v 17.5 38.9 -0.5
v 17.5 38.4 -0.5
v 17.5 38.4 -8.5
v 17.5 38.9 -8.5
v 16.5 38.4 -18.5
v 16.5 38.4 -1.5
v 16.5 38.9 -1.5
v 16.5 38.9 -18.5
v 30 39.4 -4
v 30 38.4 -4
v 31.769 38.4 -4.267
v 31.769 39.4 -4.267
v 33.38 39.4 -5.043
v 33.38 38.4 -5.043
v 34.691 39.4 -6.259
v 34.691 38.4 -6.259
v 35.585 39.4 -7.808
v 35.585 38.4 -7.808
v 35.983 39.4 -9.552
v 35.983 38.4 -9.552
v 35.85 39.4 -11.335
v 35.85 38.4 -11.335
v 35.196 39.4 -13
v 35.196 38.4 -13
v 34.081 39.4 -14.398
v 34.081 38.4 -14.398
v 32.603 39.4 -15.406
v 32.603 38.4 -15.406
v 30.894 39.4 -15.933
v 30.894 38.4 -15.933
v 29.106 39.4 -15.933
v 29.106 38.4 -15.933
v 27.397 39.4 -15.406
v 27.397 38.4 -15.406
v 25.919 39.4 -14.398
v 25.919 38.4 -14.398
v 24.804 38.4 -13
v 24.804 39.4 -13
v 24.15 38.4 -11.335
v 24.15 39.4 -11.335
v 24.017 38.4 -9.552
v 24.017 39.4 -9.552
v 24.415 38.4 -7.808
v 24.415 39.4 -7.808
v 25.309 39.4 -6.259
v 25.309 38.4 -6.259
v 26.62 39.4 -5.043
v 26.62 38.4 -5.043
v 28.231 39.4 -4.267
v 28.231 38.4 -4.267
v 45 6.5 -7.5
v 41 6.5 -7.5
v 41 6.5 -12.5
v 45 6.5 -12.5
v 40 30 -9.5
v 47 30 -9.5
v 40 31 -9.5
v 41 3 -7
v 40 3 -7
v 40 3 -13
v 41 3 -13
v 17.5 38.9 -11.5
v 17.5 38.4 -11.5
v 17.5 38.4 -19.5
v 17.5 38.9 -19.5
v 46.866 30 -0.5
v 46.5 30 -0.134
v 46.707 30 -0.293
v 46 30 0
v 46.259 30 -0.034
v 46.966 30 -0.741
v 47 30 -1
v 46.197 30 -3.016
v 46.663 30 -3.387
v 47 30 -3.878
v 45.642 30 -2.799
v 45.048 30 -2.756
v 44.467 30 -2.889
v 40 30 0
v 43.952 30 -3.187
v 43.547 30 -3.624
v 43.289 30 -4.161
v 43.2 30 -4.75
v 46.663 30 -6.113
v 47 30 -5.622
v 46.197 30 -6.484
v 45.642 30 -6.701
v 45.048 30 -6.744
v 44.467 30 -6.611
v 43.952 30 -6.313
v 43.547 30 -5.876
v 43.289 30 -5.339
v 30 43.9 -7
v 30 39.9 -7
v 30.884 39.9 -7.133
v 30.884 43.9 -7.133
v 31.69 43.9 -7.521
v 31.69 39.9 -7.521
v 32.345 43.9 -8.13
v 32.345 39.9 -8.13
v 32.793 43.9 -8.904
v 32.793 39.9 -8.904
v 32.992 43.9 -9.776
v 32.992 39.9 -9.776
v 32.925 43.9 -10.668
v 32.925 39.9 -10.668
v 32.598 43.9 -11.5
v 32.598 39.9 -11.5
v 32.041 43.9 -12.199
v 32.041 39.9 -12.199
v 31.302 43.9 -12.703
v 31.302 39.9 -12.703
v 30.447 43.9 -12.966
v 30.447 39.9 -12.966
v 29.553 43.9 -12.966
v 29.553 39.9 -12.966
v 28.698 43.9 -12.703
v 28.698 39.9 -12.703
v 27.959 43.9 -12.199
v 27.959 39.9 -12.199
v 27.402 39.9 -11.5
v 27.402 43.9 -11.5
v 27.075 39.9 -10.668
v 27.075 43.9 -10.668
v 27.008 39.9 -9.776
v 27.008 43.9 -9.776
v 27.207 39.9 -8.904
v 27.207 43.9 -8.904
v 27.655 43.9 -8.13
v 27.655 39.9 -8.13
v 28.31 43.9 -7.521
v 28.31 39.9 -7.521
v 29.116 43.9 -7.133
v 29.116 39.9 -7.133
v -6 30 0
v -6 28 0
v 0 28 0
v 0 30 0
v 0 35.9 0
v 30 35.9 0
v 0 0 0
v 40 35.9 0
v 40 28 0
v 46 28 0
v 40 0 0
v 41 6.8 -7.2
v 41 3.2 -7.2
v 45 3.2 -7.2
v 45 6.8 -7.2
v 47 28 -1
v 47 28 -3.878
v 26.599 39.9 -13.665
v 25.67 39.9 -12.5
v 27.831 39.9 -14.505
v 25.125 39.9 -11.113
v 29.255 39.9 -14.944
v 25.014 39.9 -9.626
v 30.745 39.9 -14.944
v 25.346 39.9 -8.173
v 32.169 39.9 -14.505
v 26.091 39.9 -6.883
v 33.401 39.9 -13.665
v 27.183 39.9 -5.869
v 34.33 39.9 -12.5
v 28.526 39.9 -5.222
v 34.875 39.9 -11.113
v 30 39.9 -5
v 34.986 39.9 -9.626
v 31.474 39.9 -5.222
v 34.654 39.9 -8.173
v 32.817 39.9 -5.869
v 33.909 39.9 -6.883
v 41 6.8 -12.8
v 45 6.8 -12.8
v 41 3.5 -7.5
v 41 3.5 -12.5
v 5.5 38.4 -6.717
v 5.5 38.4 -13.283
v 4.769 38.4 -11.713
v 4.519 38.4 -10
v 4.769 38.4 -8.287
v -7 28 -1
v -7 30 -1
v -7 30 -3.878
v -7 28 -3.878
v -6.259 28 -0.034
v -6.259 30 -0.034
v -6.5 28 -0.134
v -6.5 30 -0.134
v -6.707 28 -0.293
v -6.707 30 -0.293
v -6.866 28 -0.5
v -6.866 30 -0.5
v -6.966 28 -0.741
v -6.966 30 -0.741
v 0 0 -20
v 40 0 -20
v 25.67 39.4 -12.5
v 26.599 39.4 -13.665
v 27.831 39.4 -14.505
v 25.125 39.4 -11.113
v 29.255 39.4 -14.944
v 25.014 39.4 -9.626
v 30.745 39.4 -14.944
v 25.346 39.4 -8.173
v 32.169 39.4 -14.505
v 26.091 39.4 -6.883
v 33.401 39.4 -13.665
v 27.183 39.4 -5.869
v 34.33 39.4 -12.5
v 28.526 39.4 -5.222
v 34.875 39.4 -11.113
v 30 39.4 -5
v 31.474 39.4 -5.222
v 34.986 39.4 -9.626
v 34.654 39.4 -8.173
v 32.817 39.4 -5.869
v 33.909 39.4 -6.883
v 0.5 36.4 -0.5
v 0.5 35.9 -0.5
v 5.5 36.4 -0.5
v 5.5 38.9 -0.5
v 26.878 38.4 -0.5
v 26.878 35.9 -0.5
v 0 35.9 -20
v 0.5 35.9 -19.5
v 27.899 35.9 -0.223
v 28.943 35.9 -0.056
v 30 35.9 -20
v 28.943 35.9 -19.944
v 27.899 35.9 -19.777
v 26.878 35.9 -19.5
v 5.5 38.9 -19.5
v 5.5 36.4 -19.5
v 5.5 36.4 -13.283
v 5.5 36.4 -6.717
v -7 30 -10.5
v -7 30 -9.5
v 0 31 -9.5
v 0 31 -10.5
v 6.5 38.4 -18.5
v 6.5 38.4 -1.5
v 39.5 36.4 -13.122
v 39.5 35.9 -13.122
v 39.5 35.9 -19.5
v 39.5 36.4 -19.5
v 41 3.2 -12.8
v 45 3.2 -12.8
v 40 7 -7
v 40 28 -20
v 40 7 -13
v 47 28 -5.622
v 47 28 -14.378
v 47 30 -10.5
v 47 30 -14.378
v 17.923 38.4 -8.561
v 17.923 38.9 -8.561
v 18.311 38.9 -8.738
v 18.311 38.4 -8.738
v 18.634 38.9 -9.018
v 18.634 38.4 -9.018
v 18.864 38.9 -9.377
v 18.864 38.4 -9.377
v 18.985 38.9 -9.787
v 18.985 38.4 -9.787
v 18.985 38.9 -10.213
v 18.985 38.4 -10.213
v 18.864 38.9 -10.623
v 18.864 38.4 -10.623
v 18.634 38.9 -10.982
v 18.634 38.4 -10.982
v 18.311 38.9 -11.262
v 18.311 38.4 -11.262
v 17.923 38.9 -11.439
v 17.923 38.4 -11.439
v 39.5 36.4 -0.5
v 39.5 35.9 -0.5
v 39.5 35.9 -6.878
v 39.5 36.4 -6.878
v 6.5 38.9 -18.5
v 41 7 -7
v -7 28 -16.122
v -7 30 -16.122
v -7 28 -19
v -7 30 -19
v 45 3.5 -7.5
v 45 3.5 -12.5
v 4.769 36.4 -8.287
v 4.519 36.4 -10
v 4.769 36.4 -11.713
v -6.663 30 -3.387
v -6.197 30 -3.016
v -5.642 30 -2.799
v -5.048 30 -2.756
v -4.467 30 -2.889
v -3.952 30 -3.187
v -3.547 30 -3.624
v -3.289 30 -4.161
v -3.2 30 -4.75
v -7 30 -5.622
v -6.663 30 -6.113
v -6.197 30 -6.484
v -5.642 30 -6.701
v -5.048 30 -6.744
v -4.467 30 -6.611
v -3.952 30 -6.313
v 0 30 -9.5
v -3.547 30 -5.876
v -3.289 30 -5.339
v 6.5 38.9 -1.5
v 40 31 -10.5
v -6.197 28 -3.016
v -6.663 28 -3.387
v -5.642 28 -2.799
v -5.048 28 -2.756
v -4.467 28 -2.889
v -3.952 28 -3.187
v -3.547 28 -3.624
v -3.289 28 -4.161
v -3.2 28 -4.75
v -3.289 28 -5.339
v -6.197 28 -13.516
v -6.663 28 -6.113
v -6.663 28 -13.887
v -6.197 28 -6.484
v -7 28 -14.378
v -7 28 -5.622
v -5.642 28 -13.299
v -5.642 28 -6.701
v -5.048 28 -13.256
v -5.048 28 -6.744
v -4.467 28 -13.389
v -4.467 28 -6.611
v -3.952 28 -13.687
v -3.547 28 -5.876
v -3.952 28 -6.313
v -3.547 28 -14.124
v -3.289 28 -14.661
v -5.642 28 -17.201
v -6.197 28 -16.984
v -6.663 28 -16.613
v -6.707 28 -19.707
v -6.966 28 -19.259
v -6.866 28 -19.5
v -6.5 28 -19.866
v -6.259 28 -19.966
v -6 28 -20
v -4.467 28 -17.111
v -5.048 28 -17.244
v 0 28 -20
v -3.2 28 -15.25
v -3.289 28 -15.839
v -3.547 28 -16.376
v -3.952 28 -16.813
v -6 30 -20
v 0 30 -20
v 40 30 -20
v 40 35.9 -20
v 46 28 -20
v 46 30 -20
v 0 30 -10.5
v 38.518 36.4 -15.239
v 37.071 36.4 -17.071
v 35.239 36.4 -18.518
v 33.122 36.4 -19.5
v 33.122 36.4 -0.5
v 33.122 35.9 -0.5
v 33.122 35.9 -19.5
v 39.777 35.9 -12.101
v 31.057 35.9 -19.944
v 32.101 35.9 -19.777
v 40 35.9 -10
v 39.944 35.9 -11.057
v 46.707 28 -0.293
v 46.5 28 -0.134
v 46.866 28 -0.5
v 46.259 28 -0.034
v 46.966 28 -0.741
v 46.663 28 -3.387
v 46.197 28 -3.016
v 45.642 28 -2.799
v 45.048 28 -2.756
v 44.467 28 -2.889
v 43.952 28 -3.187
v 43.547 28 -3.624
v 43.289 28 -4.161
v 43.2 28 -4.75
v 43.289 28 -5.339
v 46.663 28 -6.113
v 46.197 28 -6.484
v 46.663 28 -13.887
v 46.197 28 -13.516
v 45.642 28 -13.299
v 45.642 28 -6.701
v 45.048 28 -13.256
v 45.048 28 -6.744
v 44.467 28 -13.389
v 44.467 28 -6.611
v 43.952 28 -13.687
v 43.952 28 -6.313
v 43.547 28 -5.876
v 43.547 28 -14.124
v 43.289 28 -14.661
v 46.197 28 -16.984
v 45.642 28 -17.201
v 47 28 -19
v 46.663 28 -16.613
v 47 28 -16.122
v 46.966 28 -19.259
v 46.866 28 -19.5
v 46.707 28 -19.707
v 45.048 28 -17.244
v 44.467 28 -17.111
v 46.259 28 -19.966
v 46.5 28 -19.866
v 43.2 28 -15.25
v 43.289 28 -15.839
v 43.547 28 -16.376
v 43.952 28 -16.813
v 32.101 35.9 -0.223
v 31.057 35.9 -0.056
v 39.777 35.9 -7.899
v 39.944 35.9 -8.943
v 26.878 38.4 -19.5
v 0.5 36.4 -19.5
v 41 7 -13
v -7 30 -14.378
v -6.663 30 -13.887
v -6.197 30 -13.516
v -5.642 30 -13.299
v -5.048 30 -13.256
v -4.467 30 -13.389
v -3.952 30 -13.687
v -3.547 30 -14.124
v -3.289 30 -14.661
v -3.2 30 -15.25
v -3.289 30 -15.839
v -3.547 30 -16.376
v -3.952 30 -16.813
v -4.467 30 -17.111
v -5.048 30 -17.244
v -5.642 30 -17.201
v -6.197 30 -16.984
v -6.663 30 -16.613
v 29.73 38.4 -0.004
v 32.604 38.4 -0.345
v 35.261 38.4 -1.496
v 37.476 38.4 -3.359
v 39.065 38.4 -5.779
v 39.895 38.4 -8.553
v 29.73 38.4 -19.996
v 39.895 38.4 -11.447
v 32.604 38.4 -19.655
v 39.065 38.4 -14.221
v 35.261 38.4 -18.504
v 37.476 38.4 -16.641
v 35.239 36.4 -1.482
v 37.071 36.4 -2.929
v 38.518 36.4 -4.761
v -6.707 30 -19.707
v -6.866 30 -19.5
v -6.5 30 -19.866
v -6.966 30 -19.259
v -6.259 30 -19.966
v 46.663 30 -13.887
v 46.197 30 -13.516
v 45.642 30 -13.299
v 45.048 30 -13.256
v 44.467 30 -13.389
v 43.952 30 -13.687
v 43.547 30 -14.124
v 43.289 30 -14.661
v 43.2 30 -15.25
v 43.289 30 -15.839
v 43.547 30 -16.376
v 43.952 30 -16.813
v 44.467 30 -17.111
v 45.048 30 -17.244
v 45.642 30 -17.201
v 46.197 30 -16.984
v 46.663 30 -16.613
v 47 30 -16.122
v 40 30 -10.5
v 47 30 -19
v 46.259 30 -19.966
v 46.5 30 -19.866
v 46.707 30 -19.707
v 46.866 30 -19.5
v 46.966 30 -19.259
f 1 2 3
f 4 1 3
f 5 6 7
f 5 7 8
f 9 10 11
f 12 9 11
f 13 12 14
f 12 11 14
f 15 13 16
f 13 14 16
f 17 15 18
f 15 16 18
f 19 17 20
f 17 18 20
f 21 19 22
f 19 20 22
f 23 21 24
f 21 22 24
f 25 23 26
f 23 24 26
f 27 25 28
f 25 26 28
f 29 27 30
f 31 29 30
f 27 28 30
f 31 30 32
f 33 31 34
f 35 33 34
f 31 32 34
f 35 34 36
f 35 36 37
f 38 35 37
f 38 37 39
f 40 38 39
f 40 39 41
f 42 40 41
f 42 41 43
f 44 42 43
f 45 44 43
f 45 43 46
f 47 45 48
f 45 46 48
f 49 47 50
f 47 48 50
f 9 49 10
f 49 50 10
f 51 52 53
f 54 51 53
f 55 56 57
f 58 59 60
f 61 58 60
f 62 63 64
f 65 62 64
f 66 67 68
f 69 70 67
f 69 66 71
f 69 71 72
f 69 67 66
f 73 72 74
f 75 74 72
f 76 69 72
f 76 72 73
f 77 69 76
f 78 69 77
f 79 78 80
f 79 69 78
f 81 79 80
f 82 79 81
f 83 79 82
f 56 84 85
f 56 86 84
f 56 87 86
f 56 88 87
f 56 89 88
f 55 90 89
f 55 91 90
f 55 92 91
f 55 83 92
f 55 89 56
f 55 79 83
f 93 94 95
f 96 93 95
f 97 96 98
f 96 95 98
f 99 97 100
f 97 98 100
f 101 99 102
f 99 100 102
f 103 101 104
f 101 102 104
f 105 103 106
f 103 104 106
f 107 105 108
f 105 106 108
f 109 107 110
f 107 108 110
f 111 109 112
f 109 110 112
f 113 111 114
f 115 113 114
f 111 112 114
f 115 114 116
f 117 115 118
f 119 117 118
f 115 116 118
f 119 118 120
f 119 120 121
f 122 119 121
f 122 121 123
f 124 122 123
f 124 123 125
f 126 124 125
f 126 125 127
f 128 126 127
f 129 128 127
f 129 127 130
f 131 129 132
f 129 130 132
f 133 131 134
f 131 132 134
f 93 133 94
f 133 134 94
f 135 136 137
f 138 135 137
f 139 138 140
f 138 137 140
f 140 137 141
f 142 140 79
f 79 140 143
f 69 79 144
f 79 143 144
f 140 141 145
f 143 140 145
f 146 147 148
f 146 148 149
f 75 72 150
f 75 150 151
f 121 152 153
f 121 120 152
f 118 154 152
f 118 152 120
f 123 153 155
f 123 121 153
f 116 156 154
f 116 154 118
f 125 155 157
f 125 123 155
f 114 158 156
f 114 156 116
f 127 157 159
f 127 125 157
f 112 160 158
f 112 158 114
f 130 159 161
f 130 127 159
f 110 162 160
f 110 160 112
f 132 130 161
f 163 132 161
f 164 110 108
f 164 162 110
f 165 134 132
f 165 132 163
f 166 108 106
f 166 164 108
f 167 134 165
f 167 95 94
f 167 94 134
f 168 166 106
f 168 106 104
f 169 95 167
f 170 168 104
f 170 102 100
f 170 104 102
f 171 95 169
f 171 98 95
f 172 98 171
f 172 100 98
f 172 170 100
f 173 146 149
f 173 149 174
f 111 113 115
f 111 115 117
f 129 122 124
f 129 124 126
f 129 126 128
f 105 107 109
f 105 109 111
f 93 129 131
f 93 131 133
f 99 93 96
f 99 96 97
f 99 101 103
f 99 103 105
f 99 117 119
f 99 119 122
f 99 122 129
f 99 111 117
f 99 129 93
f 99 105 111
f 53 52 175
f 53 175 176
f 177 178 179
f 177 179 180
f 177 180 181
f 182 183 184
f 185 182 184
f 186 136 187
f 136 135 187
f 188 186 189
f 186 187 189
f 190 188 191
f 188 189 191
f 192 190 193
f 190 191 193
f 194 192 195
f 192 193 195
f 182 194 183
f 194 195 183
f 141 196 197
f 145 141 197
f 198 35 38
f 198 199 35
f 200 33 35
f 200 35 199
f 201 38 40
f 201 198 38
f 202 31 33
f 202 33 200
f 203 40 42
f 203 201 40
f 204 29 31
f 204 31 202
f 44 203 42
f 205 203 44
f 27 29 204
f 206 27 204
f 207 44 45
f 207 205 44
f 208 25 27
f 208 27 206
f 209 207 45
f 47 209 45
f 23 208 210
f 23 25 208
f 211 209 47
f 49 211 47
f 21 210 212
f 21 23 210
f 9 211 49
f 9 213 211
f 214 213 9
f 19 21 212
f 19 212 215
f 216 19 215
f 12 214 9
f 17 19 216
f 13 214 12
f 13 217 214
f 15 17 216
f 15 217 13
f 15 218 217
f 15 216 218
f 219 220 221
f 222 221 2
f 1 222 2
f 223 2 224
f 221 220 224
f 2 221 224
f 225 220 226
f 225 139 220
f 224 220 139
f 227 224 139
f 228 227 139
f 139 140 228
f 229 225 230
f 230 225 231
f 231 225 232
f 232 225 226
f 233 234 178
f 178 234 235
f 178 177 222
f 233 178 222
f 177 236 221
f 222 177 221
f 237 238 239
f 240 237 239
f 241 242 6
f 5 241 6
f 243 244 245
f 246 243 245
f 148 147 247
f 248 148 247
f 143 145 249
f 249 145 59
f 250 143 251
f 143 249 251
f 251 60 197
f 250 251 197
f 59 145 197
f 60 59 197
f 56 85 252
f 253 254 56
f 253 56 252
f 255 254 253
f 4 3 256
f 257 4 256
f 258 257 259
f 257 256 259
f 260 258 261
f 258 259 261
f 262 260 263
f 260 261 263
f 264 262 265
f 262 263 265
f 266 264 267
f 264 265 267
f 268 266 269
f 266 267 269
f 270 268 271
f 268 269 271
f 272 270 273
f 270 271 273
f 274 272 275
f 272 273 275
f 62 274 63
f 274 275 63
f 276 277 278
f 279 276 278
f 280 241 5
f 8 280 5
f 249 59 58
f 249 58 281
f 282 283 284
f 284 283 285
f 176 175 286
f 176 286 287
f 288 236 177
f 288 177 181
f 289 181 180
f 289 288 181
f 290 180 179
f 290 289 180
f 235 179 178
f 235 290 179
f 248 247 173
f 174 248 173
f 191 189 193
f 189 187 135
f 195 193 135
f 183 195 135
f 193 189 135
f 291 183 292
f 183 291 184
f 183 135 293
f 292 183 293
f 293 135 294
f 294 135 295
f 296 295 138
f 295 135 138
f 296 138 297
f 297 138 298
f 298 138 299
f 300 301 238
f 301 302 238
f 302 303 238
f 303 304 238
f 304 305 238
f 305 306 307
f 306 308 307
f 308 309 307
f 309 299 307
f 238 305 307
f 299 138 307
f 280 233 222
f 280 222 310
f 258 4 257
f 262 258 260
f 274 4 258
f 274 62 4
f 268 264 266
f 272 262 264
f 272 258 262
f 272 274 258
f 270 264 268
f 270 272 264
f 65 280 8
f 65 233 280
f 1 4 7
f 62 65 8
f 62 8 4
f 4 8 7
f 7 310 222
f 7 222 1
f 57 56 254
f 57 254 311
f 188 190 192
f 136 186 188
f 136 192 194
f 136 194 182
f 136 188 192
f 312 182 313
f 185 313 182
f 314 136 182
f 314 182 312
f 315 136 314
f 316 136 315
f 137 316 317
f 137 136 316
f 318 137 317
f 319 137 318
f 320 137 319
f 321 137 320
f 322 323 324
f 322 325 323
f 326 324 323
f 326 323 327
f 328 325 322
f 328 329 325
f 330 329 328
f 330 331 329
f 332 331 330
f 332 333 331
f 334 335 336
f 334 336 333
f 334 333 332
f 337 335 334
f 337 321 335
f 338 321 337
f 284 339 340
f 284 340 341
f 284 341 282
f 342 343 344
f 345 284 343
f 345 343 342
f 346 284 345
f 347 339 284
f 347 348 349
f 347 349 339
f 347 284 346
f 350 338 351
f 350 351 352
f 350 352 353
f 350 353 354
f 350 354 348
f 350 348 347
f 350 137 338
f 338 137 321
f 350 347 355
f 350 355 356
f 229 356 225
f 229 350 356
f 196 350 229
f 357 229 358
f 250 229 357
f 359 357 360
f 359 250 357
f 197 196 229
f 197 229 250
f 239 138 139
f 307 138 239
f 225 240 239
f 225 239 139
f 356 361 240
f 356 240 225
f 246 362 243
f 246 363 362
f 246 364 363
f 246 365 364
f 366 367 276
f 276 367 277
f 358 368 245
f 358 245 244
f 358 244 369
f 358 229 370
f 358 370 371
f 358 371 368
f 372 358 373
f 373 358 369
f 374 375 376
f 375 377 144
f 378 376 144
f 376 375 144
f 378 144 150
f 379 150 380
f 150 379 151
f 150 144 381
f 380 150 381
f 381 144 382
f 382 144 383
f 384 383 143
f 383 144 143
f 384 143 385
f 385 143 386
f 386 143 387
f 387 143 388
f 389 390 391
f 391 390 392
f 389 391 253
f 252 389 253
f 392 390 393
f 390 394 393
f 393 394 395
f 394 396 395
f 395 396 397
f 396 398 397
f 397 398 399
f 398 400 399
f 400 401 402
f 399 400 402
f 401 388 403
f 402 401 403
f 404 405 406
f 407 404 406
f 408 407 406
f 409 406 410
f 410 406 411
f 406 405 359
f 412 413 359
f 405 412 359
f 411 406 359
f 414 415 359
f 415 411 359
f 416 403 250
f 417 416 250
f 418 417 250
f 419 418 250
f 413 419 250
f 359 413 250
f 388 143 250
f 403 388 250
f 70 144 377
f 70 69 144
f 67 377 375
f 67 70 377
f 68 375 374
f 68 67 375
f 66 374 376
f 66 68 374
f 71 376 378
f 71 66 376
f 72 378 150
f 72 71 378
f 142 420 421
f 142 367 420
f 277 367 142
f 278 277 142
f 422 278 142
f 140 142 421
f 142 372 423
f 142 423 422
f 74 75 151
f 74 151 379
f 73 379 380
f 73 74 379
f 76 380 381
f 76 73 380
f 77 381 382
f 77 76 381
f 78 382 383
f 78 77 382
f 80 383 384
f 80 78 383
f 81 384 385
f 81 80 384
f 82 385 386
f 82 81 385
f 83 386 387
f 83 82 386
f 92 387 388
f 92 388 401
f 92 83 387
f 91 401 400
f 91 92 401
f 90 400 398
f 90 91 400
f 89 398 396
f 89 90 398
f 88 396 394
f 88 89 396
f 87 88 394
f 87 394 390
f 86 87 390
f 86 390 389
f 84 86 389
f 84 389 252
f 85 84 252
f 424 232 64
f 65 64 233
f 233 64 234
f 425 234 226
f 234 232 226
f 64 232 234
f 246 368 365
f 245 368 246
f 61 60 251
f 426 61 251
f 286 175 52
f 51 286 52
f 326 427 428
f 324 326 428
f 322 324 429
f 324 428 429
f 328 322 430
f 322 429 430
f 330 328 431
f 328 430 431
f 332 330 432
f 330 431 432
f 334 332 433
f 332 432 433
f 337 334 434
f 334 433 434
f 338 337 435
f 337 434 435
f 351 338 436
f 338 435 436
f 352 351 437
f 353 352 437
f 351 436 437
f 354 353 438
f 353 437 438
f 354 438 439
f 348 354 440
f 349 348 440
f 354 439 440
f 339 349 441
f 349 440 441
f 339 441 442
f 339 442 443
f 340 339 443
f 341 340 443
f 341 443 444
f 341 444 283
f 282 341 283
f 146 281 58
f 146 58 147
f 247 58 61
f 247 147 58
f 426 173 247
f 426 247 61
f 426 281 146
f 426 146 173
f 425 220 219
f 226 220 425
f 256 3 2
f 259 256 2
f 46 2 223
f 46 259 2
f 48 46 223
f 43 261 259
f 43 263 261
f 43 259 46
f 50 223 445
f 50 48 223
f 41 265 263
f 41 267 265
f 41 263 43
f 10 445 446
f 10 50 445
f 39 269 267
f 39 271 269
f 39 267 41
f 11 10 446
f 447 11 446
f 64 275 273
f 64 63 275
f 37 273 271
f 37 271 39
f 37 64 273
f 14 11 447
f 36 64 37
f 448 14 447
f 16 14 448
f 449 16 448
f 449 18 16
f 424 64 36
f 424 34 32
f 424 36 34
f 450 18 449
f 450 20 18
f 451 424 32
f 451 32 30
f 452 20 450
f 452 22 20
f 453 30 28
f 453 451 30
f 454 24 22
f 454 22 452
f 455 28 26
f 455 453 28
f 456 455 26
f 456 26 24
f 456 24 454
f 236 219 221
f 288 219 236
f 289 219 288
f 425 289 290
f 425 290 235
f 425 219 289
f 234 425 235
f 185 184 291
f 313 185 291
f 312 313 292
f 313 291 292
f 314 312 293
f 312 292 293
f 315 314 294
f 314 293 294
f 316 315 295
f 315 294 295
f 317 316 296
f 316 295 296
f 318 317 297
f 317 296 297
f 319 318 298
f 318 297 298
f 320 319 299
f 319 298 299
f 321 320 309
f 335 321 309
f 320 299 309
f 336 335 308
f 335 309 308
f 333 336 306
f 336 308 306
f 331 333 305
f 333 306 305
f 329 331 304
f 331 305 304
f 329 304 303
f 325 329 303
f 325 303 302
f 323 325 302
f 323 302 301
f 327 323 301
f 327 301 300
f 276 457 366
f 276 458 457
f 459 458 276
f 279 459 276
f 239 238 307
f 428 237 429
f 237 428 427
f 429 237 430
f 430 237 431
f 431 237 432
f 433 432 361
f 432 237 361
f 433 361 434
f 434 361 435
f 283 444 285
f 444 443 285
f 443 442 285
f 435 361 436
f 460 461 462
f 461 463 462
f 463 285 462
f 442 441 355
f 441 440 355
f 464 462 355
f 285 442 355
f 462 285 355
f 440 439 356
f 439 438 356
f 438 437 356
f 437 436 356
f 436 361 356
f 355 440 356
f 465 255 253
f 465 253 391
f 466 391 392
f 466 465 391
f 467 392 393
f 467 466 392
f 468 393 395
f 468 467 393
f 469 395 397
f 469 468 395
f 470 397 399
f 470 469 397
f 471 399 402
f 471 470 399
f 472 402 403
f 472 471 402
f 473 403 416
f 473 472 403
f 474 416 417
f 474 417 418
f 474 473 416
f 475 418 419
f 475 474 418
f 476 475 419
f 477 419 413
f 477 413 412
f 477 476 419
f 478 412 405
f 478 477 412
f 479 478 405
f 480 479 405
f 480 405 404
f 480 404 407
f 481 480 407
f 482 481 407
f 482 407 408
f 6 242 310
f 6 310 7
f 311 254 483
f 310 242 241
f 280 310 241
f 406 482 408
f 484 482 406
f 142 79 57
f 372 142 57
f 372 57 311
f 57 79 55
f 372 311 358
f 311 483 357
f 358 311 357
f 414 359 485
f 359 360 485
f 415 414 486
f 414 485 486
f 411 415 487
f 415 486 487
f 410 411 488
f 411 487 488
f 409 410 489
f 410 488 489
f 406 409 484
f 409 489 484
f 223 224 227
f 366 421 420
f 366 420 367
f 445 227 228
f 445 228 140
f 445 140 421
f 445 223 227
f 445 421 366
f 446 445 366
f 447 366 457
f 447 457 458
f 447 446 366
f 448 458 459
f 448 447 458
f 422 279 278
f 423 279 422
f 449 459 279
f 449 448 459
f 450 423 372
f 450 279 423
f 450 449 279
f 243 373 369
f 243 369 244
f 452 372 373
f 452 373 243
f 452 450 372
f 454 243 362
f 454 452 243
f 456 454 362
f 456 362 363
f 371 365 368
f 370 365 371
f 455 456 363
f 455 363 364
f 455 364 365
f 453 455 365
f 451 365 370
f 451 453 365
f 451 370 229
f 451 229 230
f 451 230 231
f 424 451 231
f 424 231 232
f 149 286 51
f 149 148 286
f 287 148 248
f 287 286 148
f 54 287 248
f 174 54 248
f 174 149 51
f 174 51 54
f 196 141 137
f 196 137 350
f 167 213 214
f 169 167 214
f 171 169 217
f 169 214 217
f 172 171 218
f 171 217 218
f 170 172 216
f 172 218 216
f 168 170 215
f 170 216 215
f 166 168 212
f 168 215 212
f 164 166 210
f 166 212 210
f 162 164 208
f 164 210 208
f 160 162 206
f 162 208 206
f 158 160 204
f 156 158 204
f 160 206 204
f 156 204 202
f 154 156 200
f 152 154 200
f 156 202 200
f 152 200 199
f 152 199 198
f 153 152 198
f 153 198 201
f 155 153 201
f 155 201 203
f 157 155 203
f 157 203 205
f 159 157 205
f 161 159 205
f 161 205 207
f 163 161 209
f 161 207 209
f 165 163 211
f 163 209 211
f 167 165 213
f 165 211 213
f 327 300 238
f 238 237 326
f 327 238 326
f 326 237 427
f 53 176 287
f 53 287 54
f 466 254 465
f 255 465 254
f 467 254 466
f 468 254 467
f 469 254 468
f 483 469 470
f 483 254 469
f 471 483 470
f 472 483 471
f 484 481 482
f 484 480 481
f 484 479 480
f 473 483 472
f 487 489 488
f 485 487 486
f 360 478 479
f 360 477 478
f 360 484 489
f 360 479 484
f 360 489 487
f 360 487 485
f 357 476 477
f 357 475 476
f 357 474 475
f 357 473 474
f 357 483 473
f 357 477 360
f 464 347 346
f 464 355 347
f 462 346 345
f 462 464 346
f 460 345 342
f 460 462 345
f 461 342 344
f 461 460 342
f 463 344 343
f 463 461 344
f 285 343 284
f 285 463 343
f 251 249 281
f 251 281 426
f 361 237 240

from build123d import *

# Parameters (mm, degrees)
SKETCH1_W            = 40
SKETCH1_H            = 20
BOSS_EXTRUDE1_DEPTH  = 35.9
SKETCH2_W            = 20
SKETCH2_H            = 2
BOSS_EXTRUDE2_DEPTH  = 7
SKETCH3_W            = 7
SKETCH3_H            = 1
BOSS_EXTRUDE3_DEPTH  = 1
CUT_EXTRUDE1_REACH   = 55.852
SKETCH4_R            = 2
FILLET1_R            = 1
CUT_EXTRUDE2_DEPTH   = 11
FILLET1_OF_MIRROR1_R = 1
SKETCH6_W            = 39
SKETCH6_H            = 19
BOSS_EXTRUDE4_DEPTH  = 0.5
BOSS_EXTRUDE5_DEPTH  = 2
SKETCH8_R            = 10
BOSS_EXTRUDE6_DEPTH  = 2.5
SKETCH9_R            = 6
BOSS_EXTRUDE7_DEPTH  = 1
SKETCH10_R           = 5
BOSS_EXTRUDE8_DEPTH  = 0.5
SKETCH11_W           = 10
SKETCH11_H           = 17
BOSS_EXTRUDE9_DEPTH  = 0.5
SKETCH12_R           = 3
BOSS_EXTRUDE10_DEPTH = 4
SKETCH13_W           = 6
SKETCH13_H           = 4
BOSS_EXTRUDE11_DEPTH = 1
SKETCH14_W           = 5.6
SKETCH14_H           = 3.6
SKETCH14_W_2         = 5
SKETCH14_H_2         = 3
BOSS_EXTRUDE12_DEPTH = 4


with BuildPart() as part:
    # Sketch1 → Boss-Extrude1 (new body)
    with BuildSketch(Plane(origin=(0, 0, 0), x_dir=(1, 0, 0), z_dir=(0, 1, 0))):
        with Locations((20, 10)):
            Rectangle(SKETCH1_W, SKETCH1_H)
    extrude(amount=BOSS_EXTRUDE1_DEPTH)

    # Sketch2 → Boss-Extrude2 (add)
    with BuildSketch(Plane(origin=(0, 0, 0), x_dir=(0, 0, -1), z_dir=(1, 0, 0))):
        with Locations((10, 29)):
            Rectangle(SKETCH2_W, SKETCH2_H)
    boss_extrude2 = extrude(amount=-BOSS_EXTRUDE2_DEPTH)

    # Sketch3 → Boss-Extrude3 (add)
    with BuildSketch(Plane(origin=(0, 30, 0), x_dir=(1, 0, 0), z_dir=(0, 1, 0))):
        with Locations((-3.5, 10)):
            Rectangle(SKETCH3_W, SKETCH3_H)
    boss_extrude3 = extrude(amount=BOSS_EXTRUDE3_DEPTH)

    # Sketch4 → Cut-Extrude1 (cut, up to next)
    with BuildSketch(Plane(origin=(0, 30, 0), x_dir=(1, 0, 0), z_dir=(0, 1, 0)), mode=Mode.PRIVATE) as cut_extrude1_sk1:
        with Locations((-5.2, 15.25)):
            Circle(SKETCH4_R)
    cut_extrude1_tool1 = extrude(cut_extrude1_sk1.sketch, amount=-CUT_EXTRUDE1_REACH, mode=Mode.PRIVATE) & part.part
    # Sketch4 → Cut-Extrude1 (cut, up to next)
    with BuildSketch(Plane(origin=(0, 30, 0), x_dir=(1, 0, 0), z_dir=(0, 1, 0)), mode=Mode.PRIVATE) as cut_extrude1_sk2:
        with Locations((-5.2, 4.75)):
            Circle(SKETCH4_R)
    cut_extrude1_tool2 = extrude(cut_extrude1_sk2.sketch, amount=-CUT_EXTRUDE1_REACH, mode=Mode.PRIVATE) & part.part
    cut_extrude1_1 = cut_extrude1_tool1.solids().sort_by_distance((-5.2, 30, -15.25))[0]
    add(cut_extrude1_1, mode=Mode.SUBTRACT)
    cut_extrude1_2 = cut_extrude1_tool2.solids().sort_by_distance((-5.2, 30, -4.75))[0]
    add(cut_extrude1_2, mode=Mode.SUBTRACT)
    cut_extrude1 = cut_extrude1_1 + cut_extrude1_2  # Cut-Extrude1 as one shape, for the pattern or mirror that repeats it

    # Fillet1
    fillet1_edges = [part.edges().sort_by_distance(p)[0] for p in [
        (-7, 29, 0),
        (-7, 29, -20),
    ]]
    fillet(fillet1_edges, radius=FILLET1_R)

    # Sketch5 → Cut-Extrude2 (cut)
    with BuildSketch(Plane.XY.offset(-9.5)):
        Polygon((-7, 30), (0, 31), (-7, 31), align=None)
    cut_extrude2 = extrude(amount=-CUT_EXTRUDE2_DEPTH, mode=Mode.SUBTRACT)

    # Mirror1: Boss-Extrude2, Boss-Extrude3, Cut-Extrude1, Cut-Extrude2 across plane
    add(boss_extrude2.mirror(Plane(origin=(20, 0, 0), x_dir=(0, 0, 1), z_dir=(1, 0, 0))))
    add(boss_extrude3.mirror(Plane(origin=(20, 0, 0), x_dir=(0, 0, 1), z_dir=(1, 0, 0))))
    add(cut_extrude1.mirror(Plane(origin=(20, 0, 0), x_dir=(0, 0, 1), z_dir=(1, 0, 0))), mode=Mode.SUBTRACT)
    add(cut_extrude2.mirror(Plane(origin=(20, 0, 0), x_dir=(0, 0, 1), z_dir=(1, 0, 0))), mode=Mode.SUBTRACT)

    # Fillet1 of Mirror1
    fillet1_of_mirror1_edges = [part.edges().sort_by_distance(p)[0] for p in [
        (47, 29, 0),
        (47, 29, -20),
    ]]
    fillet(fillet1_of_mirror1_edges, radius=FILLET1_OF_MIRROR1_R)

    # Sketch6 → Boss-Extrude4 (add)
    with BuildSketch(Plane(origin=(0, 35.9, 0), x_dir=(1, 0, 0), z_dir=(0, 1, 0))):
        with Locations((20, 10)):
            Rectangle(SKETCH6_W, SKETCH6_H)
    extrude(amount=BOSS_EXTRUDE4_DEPTH)

    # Sketch7 → Boss-Extrude5 (add)
    with BuildSketch(Plane(origin=(0, 36.4, 0), x_dir=(1, 0, 0), z_dir=(0, 1, 0))):
        with BuildLine():
            Line((5.5, 19.5), (30.5, 19.5))
            Line((30.5, 19.5), (30.5, 0.5))
            Line((30.5, 0.5), (5.5, 0.5))
            Line((5.5, 0.5), (5.5, 6.717431229))
            ThreePointArc((5.5, 6.717431229), (4.518757843, 10), (5.5, 13.282568771))
            Line((5.5, 13.282568771), (5.5, 19.5))
        make_face()
    extrude(amount=BOSS_EXTRUDE5_DEPTH)

    # Sketch8 → Boss-Extrude6 (add)
    with BuildSketch(Plane(origin=(0, 38.4, 0), x_dir=(1, 0, 0), z_dir=(0, 1, 0))):
        with Locations((30, 10)):
            Circle(SKETCH8_R)
    extrude(amount=-BOSS_EXTRUDE6_DEPTH)

    # Sketch9 → Boss-Extrude7 (add)
    with BuildSketch(Plane(origin=(0, 38.4, 0), x_dir=(1, 0, 0), z_dir=(0, 1, 0))):
        with Locations(Location((30, 10, 0), (0, 0, 270))):
            Circle(SKETCH9_R)
    extrude(amount=BOSS_EXTRUDE7_DEPTH)

    # Sketch10 → Boss-Extrude8 (add)
    with BuildSketch(Plane(origin=(0, 39.4, 0), x_dir=(1, 0, 0), z_dir=(0, 1, 0))):
        with Locations(Location((30, 10, 0), (0, 0, 270))):
            Circle(SKETCH10_R)
    extrude(amount=BOSS_EXTRUDE8_DEPTH)

    # Sketch11 → Boss-Extrude9 (add)
    with BuildSketch(Plane(origin=(0, 38.4, 0), x_dir=(1, 0, 0), z_dir=(0, 1, 0))):
        with BuildLine():
            Line((5.5, 0.5), (17.5, 0.5))
            Line((17.5, 0.5), (17.5, 8.5))
            ThreePointArc((17.5, 8.5), (19, 10), (17.5, 11.5))
            Line((17.5, 11.5), (17.5, 19.5))
            Line((17.5, 19.5), (5.5, 19.5))
            Line((5.5, 19.5), (5.5, 0.5))
        make_face()
        with Locations((11.5, 10)):
            Rectangle(SKETCH11_W, SKETCH11_H, mode=Mode.SUBTRACT)
    extrude(amount=BOSS_EXTRUDE9_DEPTH)

    # Sketch12 → Boss-Extrude10 (add)
    with BuildSketch(Plane(origin=(0, 39.9, 0), x_dir=(1, 0, 0), z_dir=(0, 1, 0))):
        with Locations(Location((30, 10, 0), (0, 0, 270))):
            Circle(SKETCH12_R)
    extrude(amount=BOSS_EXTRUDE10_DEPTH)

    # Sketch13 → Boss-Extrude11 (add)
    with BuildSketch(Plane(origin=(40, 0, 0), x_dir=(0, 0, -1), z_dir=(1, 0, 0))):
        with Locations((10, 5)):
            Rectangle(SKETCH13_W, SKETCH13_H)
    extrude(amount=BOSS_EXTRUDE11_DEPTH)

    # Sketch14 → Boss-Extrude12 (add)
    with BuildSketch(Plane(origin=(41, 0, 0), x_dir=(0, 0, -1), z_dir=(1, 0, 0))):
        with Locations((10, 5)):
            Rectangle(SKETCH14_W, SKETCH14_H)
        with Locations((10, 5)):
            Rectangle(SKETCH14_W_2, SKETCH14_H_2, mode=Mode.SUBTRACT)
    extrude(amount=BOSS_EXTRUDE12_DEPTH)


solid = part.part
